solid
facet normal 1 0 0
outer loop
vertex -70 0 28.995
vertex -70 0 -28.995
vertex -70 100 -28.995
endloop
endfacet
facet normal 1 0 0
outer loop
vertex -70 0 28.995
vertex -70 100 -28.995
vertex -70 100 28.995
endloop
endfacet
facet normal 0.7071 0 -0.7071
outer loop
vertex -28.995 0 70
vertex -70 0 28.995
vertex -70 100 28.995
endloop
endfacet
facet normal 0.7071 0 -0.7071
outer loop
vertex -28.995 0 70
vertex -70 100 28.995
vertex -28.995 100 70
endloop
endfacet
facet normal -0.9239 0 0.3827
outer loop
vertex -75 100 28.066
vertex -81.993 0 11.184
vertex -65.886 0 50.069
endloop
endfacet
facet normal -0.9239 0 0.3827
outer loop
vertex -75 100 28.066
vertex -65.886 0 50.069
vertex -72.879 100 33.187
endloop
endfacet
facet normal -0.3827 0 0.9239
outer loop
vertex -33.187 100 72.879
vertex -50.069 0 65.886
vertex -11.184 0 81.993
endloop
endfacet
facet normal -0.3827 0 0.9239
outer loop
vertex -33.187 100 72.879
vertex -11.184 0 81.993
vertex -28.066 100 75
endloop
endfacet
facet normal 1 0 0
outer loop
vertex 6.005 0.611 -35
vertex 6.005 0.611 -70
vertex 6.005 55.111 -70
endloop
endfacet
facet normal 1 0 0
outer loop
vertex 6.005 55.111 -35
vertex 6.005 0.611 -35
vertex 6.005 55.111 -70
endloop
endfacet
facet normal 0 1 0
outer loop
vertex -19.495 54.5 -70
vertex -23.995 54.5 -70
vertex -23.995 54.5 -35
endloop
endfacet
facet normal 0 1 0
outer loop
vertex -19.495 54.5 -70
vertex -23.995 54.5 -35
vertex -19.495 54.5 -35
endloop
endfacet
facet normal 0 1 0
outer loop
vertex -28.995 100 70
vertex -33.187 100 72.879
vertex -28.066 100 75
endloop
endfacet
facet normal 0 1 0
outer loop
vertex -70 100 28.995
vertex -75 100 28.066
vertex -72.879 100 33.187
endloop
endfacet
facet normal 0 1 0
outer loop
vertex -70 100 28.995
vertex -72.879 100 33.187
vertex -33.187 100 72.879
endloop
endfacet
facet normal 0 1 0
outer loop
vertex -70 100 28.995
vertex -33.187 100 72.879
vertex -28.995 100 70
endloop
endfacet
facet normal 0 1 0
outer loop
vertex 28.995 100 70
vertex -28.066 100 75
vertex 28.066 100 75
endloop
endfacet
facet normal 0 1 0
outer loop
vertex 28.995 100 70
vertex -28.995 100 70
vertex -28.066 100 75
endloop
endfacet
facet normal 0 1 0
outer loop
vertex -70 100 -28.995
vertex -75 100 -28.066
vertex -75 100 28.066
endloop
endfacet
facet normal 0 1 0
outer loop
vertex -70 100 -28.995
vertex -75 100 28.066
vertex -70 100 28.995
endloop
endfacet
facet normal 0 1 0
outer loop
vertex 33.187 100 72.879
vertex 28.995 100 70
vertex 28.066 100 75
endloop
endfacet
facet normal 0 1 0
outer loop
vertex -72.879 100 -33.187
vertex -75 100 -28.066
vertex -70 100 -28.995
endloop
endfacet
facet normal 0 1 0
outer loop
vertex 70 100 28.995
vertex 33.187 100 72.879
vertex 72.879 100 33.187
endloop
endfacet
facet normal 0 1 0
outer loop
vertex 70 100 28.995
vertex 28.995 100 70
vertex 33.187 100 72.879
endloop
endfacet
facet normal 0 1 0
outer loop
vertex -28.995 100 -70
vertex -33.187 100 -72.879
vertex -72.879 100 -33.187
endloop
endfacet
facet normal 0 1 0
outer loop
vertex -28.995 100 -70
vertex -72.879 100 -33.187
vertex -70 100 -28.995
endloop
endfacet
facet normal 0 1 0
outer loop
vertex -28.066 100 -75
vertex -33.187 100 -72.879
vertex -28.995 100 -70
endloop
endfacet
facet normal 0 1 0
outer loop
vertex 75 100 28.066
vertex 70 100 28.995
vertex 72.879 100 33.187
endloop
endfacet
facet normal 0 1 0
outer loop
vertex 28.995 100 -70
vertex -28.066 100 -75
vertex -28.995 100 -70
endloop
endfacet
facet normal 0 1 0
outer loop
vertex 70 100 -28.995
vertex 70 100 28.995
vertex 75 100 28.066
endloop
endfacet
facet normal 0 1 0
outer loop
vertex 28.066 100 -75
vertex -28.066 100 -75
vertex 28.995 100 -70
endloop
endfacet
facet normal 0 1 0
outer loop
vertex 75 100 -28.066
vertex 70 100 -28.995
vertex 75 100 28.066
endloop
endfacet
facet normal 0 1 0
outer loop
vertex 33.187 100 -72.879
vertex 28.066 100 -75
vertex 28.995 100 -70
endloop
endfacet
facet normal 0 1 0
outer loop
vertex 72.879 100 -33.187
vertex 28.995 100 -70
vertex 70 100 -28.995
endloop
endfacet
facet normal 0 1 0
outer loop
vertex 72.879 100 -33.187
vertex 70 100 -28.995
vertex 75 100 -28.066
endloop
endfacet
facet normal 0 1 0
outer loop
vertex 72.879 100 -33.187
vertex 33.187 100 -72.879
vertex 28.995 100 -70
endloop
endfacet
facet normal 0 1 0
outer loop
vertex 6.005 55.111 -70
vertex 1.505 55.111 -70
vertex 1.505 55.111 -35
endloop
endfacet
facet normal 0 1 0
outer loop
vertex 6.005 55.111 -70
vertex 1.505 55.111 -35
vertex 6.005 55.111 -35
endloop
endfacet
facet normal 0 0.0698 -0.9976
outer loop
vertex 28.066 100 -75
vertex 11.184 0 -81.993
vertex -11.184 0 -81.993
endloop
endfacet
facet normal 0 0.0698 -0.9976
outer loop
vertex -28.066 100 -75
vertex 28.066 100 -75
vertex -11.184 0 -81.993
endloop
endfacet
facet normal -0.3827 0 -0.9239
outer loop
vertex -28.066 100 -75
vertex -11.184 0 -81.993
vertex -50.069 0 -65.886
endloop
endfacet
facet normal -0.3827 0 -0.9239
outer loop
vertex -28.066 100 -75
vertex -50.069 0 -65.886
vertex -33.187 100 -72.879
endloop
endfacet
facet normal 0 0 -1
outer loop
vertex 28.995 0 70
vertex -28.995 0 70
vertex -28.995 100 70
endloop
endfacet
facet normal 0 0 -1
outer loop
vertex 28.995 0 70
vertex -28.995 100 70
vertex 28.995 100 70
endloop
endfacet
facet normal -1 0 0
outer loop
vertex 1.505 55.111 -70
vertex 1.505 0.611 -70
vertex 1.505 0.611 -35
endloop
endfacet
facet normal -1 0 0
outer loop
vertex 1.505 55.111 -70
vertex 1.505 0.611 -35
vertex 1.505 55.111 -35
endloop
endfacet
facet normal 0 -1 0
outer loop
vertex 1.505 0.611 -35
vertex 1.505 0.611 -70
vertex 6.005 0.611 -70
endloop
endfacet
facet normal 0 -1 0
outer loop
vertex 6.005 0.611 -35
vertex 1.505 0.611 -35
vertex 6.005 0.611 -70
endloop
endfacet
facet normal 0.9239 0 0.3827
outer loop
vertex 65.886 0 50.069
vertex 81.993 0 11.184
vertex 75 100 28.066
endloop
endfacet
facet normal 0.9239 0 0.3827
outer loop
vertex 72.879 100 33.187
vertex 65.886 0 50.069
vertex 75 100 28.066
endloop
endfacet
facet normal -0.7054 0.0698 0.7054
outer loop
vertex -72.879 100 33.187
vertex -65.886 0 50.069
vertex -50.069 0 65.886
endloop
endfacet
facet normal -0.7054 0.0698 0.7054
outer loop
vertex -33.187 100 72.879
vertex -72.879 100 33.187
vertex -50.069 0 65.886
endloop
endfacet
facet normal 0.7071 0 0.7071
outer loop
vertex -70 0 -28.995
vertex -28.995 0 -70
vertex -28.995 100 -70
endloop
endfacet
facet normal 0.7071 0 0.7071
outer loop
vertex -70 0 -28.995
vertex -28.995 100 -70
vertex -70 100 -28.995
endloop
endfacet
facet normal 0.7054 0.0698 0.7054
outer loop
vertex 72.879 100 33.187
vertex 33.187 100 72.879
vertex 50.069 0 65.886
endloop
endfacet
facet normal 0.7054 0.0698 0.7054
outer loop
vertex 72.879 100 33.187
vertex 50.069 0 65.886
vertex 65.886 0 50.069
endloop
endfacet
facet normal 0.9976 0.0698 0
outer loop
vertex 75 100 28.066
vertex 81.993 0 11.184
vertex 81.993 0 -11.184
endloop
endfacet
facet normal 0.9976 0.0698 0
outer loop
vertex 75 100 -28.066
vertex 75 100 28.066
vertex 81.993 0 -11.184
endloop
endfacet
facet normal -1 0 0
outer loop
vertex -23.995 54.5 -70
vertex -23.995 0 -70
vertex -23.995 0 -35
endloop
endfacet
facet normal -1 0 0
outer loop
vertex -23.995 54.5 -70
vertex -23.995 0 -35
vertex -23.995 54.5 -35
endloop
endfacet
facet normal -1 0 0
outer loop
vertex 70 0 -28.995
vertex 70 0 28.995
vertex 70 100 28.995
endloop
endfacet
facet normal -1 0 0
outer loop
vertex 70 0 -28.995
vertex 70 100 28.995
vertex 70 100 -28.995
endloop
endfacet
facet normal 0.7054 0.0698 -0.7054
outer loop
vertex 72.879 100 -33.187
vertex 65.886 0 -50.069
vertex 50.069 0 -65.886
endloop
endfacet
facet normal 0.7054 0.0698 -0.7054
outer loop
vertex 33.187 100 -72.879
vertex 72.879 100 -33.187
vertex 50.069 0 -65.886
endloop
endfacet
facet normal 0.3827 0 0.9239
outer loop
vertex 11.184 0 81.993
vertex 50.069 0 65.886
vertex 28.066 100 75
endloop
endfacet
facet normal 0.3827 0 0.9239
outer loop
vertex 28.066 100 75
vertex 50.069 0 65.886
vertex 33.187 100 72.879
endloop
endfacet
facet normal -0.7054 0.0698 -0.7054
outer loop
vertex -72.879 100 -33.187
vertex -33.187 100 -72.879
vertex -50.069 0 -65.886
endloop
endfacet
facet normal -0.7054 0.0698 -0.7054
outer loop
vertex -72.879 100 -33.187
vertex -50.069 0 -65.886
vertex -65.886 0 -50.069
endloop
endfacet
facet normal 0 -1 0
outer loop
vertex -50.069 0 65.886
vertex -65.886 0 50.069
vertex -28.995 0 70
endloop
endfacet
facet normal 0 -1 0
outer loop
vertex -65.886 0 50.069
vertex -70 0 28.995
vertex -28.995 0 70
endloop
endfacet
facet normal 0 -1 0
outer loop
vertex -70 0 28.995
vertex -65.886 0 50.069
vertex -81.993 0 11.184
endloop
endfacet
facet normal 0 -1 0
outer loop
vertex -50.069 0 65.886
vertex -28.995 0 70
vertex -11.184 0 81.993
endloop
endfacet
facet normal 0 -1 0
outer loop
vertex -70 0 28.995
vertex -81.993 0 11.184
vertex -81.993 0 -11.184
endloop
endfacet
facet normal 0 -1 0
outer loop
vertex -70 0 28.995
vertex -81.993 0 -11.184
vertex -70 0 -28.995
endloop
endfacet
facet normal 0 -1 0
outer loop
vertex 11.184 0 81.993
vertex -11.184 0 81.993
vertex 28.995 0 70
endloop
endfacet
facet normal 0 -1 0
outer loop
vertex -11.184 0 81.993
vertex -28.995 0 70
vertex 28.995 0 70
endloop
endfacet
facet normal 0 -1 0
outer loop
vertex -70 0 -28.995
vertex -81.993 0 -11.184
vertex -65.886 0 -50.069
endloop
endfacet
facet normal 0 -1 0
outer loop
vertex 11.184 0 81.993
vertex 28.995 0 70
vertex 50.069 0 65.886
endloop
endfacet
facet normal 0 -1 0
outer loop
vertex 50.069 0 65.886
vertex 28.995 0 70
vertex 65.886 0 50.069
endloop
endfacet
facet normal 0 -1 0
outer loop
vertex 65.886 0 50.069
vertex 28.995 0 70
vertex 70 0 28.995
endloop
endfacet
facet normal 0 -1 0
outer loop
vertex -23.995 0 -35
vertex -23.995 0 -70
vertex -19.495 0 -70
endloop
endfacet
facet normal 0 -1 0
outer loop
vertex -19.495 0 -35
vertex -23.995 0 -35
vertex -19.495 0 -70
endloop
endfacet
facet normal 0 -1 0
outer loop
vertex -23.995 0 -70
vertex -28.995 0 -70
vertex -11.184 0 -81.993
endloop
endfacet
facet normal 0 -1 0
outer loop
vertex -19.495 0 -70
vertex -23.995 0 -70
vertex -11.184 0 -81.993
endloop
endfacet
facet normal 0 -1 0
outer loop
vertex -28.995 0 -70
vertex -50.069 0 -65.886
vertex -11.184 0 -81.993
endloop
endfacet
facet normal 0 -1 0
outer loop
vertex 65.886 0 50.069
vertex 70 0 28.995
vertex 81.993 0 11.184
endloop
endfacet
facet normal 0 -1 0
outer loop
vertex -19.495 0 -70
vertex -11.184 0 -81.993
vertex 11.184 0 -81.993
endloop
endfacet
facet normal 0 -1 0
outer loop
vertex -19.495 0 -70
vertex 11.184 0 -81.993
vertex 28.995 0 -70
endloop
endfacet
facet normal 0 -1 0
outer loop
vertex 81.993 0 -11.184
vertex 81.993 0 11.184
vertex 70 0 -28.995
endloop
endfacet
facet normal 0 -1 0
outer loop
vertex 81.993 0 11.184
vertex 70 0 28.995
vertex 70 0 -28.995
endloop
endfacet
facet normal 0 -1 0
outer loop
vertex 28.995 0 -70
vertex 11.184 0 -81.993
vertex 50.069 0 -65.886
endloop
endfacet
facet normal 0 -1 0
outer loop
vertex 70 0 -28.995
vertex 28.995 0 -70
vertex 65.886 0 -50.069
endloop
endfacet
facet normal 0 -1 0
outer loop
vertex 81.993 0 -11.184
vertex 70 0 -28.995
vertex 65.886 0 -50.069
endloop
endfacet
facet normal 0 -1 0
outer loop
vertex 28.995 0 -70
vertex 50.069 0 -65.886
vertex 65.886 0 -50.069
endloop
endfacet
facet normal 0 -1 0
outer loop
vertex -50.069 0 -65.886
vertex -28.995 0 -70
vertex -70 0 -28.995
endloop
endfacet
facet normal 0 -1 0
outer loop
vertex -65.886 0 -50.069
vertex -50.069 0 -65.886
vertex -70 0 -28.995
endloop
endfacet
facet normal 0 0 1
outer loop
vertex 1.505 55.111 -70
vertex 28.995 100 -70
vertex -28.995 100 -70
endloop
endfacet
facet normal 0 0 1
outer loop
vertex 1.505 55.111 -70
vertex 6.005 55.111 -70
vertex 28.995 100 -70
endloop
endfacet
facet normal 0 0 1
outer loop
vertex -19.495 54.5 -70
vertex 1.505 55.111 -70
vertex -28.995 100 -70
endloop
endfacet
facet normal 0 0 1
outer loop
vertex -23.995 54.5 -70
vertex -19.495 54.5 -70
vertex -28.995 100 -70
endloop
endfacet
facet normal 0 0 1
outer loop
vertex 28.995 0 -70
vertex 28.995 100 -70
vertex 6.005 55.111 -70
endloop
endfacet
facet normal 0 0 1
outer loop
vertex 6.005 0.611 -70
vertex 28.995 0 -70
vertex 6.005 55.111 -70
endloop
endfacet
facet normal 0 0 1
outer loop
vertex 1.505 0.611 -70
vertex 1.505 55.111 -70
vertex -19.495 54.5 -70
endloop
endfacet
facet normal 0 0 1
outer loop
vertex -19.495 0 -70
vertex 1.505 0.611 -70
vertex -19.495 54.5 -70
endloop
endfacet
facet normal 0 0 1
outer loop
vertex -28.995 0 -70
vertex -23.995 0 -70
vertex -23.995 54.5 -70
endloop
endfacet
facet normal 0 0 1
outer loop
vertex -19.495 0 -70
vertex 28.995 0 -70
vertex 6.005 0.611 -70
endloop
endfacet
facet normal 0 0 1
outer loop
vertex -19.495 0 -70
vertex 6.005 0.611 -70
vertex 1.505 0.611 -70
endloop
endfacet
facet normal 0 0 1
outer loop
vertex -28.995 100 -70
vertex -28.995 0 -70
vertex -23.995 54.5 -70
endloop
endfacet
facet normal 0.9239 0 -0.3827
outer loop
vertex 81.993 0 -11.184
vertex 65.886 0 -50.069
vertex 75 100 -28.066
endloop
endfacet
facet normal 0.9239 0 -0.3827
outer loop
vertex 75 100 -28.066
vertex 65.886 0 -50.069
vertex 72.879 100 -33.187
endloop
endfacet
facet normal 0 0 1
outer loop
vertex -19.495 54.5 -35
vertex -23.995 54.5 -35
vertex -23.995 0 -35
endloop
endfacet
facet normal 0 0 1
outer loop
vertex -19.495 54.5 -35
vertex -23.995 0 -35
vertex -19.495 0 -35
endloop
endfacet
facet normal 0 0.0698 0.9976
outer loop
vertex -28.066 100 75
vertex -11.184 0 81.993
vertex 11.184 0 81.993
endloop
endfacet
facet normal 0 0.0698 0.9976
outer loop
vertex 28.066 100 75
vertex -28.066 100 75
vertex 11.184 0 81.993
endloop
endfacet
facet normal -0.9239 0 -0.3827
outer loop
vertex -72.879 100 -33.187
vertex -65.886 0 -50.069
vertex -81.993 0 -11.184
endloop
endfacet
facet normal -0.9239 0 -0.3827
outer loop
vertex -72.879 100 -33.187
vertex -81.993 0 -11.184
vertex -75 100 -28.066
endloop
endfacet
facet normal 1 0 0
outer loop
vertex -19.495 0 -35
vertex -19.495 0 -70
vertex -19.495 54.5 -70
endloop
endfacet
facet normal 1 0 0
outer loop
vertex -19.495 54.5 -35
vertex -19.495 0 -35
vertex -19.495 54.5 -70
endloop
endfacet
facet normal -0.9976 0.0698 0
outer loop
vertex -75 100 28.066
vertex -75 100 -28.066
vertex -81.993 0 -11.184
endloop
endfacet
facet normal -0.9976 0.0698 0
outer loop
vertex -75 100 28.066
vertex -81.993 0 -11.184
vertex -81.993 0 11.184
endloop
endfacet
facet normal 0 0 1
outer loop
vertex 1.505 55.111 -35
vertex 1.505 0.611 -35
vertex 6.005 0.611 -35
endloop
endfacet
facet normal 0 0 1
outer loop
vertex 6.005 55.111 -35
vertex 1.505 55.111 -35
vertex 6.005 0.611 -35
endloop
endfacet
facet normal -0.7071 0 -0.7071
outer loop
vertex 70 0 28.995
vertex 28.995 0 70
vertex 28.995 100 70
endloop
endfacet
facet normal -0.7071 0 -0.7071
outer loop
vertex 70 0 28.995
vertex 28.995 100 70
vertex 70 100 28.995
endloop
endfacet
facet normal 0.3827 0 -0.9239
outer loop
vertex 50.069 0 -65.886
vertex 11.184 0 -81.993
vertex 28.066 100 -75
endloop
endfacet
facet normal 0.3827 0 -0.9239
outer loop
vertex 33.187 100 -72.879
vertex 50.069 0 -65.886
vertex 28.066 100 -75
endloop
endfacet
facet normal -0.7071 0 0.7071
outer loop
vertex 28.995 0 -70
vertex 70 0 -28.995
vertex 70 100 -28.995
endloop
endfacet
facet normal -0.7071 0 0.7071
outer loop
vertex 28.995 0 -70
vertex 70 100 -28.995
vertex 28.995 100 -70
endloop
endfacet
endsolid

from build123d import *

# Parameters (mm, degrees)
BOSS_EXTRUDE2_DEPTH = 100
SKETCH2_W           = 4.5
SKETCH2_H           = 54.5
BOSS_EXTRUDE3_DEPTH = 35
CHAMFER1_SIZE       = 3
DRAFT2_ANGLE        = 4


with BuildPart() as part:
    # Sketch1 → Boss-Extrude2 (new body)
    with BuildSketch(Plane(origin=(0, 0, 0), x_dir=(1, 0, 0), z_dir=(0, 1, 0))):
        Polygon((-31.066017178, -75), (31.066017178, -75), (75, -31.066017178), (75, 31.066017178), (31.066017178, 75), (-31.066017178, 75), (-75, 31.066017178), (-75, -31.066017178), align=None)
        Polygon((28.994949366, -70), (70, -28.994949366), (70, 28.994949366), (28.994949366, 70), (-28.994949366, 70), (-70, 28.994949366), (-70, -28.994949366), (-28.994949366, -70), align=None, mode=Mode.SUBTRACT)
    extrude(amount=BOSS_EXTRUDE2_DEPTH)

    # Sketch2 → Boss-Extrude3 (add)
    with BuildSketch(Plane.XY.offset(-70)):
        with Locations((-21.744949366, 27.25)):
            Rectangle(SKETCH2_W, SKETCH2_H)
        with Locations((3.755050634, 27.860857485)):
            Rectangle(SKETCH2_W, SKETCH2_H)
    extrude(amount=BOSS_EXTRUDE3_DEPTH)

    # Chamfer1
    chamfer1_edges = [part.edges().sort_by_distance(p)[0] for p in [
        (-31.066017178, 50, 75),
        (-75, 50, 31.066017178),
        (-75, 50, -31.066017178),
        (-31.066017178, 50, -75),
        (31.066017178, 50, -75),
        (75, 50, -31.066017178),
        (75, 50, 31.066017178),
        (31.066017178, 50, 75),
    ]]
    chamfer(chamfer1_edges, length=CHAMFER1_SIZE)

    # Draft2
    draft2_faces = [part.faces().sort_by_distance(p)[0] for p in [
        (53.033008589, 50, -53.033008589),
        (0, 50, -75),
        (-53.033008589, 50, -53.033008589),
        (-75, 50, 0),
        (-53.033008589, 50, 53.033008589),
        (0, 50, 75),
        (53.033008589, 50, 53.033008589),
        (75, 50, 0),
    ]]
    draft(draft2_faces, Plane.ZX.offset(100), DRAFT2_ANGLE)


solid = part.part
